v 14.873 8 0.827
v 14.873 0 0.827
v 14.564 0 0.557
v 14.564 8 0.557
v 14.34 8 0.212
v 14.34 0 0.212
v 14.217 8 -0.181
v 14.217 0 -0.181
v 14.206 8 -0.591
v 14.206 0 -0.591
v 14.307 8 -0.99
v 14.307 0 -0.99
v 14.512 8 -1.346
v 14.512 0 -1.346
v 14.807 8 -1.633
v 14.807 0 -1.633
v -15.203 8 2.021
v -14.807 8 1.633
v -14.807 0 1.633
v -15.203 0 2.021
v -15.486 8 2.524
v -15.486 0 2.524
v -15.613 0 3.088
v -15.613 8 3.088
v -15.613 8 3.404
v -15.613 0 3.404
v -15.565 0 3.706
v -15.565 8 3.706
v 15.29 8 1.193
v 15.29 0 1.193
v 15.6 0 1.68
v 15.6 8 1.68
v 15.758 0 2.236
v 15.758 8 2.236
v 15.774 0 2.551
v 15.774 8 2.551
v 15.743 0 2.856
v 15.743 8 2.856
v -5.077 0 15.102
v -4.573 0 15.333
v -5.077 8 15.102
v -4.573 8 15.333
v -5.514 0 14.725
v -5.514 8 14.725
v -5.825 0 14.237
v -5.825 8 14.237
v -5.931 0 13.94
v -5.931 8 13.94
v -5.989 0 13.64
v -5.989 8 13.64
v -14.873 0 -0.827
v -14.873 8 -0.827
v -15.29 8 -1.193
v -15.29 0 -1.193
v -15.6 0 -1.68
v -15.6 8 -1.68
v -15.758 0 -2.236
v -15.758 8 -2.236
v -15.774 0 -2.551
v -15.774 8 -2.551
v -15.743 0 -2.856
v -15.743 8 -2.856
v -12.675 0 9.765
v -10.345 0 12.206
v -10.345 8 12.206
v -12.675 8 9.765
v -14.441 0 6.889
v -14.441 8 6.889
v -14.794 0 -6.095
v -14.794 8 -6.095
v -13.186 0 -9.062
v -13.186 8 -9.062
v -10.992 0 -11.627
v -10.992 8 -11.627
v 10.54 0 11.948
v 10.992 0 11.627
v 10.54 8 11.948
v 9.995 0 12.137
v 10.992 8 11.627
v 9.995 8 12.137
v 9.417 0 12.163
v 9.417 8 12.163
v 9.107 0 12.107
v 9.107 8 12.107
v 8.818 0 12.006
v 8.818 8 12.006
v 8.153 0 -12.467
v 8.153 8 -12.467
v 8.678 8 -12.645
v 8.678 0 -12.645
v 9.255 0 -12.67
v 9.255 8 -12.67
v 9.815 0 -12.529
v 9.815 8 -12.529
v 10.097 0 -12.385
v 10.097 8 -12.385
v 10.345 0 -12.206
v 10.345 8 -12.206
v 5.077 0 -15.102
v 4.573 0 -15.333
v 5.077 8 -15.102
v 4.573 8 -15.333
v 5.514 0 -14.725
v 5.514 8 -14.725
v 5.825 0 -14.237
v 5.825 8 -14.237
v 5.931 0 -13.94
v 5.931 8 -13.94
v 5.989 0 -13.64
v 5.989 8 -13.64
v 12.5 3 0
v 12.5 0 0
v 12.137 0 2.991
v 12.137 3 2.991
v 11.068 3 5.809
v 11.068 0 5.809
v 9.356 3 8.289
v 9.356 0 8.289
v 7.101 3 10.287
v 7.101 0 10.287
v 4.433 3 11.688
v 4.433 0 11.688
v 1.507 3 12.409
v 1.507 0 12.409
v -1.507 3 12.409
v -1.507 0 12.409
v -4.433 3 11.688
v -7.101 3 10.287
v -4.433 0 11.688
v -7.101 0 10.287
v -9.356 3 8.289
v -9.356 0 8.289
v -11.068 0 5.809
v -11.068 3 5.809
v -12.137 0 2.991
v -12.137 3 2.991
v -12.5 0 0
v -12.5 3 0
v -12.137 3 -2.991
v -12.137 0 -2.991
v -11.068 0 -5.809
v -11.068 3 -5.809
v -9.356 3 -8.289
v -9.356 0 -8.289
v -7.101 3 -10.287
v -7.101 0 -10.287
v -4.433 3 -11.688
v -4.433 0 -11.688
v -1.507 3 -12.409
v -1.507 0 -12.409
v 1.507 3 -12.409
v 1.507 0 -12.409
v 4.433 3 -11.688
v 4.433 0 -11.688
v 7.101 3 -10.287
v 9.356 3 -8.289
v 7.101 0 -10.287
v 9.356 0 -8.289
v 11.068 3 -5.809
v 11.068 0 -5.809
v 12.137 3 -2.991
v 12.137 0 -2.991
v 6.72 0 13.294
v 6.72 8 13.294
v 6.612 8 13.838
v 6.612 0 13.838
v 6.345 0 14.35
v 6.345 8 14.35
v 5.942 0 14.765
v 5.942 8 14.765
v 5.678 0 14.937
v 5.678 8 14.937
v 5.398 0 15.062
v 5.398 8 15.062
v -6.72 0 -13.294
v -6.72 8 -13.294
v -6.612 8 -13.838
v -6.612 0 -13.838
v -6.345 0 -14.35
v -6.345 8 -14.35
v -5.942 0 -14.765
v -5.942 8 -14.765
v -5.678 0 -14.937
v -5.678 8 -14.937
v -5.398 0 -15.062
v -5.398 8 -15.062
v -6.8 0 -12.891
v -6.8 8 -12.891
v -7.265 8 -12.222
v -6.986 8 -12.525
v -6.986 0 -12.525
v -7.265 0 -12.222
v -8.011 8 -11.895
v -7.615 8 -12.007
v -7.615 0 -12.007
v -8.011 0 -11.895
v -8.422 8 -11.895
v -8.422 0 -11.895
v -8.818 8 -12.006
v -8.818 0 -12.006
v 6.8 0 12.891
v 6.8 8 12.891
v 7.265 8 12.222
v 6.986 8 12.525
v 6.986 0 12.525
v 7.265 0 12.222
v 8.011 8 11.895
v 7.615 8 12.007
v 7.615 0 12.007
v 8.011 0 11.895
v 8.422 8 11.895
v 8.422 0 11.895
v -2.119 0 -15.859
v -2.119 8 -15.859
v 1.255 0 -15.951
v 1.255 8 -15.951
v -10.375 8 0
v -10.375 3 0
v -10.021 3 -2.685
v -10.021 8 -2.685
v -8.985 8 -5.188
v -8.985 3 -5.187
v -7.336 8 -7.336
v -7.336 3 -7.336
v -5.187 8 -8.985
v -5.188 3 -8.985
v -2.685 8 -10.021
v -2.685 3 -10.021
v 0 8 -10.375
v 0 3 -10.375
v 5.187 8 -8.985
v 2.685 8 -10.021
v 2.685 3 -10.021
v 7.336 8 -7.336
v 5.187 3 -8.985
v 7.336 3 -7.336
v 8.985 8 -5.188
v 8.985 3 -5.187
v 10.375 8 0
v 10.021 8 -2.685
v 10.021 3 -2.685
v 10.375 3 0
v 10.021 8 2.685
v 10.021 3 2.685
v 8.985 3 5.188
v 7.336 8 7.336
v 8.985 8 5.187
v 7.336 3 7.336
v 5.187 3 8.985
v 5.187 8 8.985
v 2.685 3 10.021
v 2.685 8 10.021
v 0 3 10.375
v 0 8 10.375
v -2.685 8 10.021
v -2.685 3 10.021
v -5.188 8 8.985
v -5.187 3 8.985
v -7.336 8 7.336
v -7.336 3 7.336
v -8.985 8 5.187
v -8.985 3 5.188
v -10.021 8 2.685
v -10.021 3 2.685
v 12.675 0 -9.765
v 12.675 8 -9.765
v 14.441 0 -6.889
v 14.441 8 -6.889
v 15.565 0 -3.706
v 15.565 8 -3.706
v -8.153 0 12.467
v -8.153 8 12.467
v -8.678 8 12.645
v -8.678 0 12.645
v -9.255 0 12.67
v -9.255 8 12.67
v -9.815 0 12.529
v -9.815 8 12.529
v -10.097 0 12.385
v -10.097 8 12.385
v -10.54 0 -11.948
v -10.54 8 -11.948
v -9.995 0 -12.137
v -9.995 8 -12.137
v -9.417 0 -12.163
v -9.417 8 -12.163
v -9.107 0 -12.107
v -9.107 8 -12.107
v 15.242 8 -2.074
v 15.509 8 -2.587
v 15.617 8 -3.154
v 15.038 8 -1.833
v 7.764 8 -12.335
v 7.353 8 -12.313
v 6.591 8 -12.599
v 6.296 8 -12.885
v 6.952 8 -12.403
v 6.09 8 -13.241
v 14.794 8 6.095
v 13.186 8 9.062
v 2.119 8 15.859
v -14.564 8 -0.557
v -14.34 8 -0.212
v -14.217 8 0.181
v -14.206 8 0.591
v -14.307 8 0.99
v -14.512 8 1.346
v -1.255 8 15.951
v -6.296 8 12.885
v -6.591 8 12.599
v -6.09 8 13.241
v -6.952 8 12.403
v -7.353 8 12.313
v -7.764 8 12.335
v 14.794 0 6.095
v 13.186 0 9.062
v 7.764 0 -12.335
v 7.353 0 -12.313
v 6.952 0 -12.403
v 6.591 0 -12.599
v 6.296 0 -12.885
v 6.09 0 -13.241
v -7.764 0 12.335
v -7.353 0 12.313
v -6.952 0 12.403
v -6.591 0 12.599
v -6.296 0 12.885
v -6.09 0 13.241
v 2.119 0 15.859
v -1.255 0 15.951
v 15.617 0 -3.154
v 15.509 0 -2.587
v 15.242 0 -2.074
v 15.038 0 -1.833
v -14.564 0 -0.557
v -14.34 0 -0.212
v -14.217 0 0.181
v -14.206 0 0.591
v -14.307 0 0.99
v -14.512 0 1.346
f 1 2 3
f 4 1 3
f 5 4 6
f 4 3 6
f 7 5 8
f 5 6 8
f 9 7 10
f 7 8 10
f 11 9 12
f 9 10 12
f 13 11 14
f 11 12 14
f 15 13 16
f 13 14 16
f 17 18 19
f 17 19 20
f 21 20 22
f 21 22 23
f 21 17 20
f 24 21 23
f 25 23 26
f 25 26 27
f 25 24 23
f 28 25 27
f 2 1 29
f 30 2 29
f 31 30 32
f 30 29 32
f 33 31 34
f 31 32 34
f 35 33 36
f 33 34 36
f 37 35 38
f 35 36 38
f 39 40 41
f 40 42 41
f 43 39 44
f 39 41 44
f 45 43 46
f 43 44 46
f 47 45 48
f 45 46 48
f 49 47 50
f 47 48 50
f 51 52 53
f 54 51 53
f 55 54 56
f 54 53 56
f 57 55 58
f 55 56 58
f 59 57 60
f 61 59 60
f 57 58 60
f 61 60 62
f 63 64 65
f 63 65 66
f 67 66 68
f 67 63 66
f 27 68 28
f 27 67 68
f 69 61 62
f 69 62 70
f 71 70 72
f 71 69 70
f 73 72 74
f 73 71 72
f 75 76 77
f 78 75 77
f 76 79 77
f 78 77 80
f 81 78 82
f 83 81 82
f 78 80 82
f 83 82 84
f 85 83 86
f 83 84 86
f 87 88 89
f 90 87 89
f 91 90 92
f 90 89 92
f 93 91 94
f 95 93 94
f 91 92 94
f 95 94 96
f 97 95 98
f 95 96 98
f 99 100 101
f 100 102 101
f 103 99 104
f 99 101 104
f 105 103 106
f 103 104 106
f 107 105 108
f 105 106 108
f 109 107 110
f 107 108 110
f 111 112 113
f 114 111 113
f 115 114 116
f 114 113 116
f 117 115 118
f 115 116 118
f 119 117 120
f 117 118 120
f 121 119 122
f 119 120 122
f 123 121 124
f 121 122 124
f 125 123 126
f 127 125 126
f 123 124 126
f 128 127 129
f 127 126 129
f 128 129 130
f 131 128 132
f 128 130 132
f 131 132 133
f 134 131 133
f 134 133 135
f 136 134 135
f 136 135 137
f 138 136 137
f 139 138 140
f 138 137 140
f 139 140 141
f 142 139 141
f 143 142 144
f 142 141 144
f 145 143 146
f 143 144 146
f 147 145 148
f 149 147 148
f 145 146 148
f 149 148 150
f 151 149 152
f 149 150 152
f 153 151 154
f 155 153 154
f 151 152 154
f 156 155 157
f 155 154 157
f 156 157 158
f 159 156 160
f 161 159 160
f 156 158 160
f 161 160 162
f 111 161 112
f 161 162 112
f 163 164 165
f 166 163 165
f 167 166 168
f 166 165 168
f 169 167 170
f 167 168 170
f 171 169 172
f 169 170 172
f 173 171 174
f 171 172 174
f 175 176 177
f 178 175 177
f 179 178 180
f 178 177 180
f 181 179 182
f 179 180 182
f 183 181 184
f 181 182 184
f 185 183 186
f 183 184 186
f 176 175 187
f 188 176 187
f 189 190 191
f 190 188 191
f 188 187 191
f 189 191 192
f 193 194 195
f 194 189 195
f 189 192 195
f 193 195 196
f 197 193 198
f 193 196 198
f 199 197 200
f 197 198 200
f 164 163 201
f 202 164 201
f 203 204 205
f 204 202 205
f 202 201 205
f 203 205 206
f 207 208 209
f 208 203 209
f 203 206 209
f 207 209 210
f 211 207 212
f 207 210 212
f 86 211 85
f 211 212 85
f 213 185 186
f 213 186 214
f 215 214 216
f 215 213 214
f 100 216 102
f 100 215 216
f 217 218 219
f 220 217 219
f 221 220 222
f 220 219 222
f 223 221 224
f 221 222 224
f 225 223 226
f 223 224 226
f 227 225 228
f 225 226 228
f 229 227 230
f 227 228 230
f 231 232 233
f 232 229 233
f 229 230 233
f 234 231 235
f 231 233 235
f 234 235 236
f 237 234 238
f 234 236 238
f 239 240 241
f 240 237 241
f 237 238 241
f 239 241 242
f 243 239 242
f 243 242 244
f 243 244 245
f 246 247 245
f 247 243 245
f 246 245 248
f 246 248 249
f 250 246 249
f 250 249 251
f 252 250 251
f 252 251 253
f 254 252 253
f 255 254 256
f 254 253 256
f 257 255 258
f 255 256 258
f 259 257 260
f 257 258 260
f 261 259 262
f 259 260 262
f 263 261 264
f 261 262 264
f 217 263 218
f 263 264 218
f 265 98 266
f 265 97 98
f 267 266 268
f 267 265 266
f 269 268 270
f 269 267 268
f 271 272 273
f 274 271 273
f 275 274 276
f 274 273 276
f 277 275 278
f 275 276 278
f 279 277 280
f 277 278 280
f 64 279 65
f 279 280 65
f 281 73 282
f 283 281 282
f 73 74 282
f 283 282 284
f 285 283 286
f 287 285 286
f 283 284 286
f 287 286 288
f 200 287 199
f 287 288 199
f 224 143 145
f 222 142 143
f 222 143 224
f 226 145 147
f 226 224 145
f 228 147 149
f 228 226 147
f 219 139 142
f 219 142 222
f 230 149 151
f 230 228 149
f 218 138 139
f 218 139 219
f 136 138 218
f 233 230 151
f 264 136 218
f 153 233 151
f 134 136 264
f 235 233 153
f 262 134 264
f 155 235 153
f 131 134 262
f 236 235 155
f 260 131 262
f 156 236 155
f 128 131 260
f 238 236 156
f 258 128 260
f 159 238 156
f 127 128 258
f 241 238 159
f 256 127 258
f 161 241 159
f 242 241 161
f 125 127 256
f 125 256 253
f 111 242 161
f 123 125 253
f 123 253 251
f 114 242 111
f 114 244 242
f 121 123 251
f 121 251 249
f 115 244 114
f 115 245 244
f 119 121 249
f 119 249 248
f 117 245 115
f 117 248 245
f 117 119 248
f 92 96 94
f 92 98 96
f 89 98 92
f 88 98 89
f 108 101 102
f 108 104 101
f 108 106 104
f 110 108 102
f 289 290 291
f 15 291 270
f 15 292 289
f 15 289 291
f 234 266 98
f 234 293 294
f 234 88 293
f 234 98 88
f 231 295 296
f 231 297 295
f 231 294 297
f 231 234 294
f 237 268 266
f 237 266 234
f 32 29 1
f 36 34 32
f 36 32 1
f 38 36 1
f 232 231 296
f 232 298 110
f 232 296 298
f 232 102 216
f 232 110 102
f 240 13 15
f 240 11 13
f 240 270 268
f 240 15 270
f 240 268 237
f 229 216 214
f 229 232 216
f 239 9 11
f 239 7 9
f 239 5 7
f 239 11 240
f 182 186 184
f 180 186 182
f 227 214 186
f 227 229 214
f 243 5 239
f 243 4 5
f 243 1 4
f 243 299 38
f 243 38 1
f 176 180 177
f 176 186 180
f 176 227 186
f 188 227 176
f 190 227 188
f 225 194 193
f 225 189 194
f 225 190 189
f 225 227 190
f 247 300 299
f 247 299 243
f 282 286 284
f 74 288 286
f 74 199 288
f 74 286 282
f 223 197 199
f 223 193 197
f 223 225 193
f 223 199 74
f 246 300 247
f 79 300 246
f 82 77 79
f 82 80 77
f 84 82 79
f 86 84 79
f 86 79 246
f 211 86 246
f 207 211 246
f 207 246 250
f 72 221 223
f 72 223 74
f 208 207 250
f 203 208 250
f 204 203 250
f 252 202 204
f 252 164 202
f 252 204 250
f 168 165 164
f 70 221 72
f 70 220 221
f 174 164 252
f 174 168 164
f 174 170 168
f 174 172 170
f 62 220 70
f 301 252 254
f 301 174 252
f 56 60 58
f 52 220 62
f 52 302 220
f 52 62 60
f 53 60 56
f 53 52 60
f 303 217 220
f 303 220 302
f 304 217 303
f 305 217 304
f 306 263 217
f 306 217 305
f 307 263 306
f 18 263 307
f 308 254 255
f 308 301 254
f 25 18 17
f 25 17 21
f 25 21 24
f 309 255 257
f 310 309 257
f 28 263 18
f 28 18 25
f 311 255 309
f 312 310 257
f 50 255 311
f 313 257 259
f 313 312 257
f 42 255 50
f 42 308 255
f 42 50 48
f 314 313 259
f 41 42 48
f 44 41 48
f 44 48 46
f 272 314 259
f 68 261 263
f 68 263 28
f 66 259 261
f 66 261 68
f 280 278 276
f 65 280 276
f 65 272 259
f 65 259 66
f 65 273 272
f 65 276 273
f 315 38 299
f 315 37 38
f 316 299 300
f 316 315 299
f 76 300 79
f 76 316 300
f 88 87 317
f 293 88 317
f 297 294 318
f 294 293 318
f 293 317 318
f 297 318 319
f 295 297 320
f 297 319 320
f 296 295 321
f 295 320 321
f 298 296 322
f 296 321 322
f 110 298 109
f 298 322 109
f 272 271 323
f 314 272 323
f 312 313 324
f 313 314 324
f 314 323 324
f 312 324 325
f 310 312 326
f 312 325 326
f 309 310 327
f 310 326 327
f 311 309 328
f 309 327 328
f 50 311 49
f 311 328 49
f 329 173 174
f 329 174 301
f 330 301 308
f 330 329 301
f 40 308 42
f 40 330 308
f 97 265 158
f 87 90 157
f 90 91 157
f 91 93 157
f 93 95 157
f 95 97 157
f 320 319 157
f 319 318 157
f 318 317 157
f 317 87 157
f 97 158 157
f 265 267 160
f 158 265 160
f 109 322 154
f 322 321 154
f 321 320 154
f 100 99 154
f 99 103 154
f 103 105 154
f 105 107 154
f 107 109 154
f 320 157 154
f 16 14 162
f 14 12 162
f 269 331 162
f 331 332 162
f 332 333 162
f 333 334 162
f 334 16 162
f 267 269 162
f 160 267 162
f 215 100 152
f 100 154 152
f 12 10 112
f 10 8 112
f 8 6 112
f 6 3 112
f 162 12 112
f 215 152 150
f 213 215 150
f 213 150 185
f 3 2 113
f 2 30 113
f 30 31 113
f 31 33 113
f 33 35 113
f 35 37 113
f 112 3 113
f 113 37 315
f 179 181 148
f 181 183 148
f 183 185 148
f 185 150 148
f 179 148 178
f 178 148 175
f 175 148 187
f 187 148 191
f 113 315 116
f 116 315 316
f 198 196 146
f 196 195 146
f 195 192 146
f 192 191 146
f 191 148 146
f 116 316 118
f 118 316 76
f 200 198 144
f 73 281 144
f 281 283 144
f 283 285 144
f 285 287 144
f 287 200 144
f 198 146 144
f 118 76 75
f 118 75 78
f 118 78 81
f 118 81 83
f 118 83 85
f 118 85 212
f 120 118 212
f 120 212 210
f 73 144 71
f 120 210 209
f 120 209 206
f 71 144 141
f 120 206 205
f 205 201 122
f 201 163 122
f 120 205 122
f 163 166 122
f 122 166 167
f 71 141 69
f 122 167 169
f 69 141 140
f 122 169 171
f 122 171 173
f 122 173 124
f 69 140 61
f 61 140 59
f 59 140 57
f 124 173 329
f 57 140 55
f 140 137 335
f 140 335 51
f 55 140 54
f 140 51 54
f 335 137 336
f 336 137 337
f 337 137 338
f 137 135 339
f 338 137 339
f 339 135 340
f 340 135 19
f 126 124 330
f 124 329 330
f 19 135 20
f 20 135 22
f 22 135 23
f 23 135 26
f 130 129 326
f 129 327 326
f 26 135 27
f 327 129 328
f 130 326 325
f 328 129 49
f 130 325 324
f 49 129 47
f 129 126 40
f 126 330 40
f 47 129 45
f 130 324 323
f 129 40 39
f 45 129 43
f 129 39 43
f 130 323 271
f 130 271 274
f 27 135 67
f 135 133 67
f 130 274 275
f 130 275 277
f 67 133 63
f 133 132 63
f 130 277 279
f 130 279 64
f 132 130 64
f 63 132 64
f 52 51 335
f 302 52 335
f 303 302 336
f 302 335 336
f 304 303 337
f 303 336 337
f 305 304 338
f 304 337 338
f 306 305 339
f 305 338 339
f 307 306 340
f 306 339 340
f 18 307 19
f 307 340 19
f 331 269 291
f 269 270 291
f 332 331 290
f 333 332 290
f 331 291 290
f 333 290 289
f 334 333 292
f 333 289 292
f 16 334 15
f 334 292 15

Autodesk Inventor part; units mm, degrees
ref_plane "YZ Plane" through (0, 0, 0) normal (1, 0, 0) x (0, 1, 0)
ref_plane "XZ Plane" through (0, 0, 0) normal (0, 1, 0) x (-1, 0, 0)
ref_plane "XY Plane" through (0, 0, 0) normal (0, 0, 1) x (1, 0, 0)
sketch "Sketch1" plane through (0, 0, 0) normal (0, 1, 0) x (-1, 0, 0)
  circle A0 centre (0, 0) radius 10.375
  arc A1 (15.885, 1.9145) -> (15.9655, -1.0494) centre (15.6971, 0.4263) ccw
  arc A2 (6.2845, 14.7141) -> (8.8916, 13.3018) centre (7.4793, 13.8073) ccw
  arc A3 (-9.6005, 12.7996) -> (-7.0739, 14.3513) centre (-8.2178, 13.3809) ccw
  arc A4 (-15.885, -1.9145) -> (-15.9655, 1.0494) centre (-15.6971, -0.4263) ccw
  arc A5 (-6.2845, -14.7141) -> (-8.8916, -13.3018) centre (-7.4793, -13.8073) ccw
  arc A6 (9.6005, -12.7996) -> (7.0739, -14.3513) centre (8.2178, -13.3809) ccw
  arc A7 (9.6005, -12.7996) -> (15.9655, -1.0494) centre (0, 0) ccw
  arc A8 (-6.2845, -14.7141) -> (7.0739, -14.3513) centre (0, 0) ccw
  arc A9 (-15.885, -1.9145) -> (-8.8916, -13.3018) centre (0, 0) ccw
  arc A10 (-9.6005, 12.7996) -> (-15.9655, 1.0494) centre (0, 0) ccw
  arc A11 (15.885, 1.9145) -> (8.8916, 13.3018) centre (0, 0) ccw
  arc A12 (6.2845, 14.7141) -> (-7.0739, 14.3513) centre (0, 0) ccw
  dimension "d0" = 20.75
  dimension "d4" = 3
  dimension "d7" = 360
  dimension "d10" = 16
extrude "Extrusion1" add sketch "Sketch1" along normal blind 8
fillet "Fillet1" radius 2 12 edges at (9.6005, 4, 12.7996) (15.9655, 4, 1.0494) (15.885, 4, -1.9145) (8.8916, 4, -13.3018) (6.2845, 4, -14.7141) (-7.0739, 4, -14.3513) (-9.6005, 4, -12.7996) (-15.9655, 4, -1.0494) (-15.885, 4, 1.9145) (-8.8916, 4, 13.3018) (-6.2845, 4, 14.7141) (7.0739, 4, 14.3513)
sketch "Sketch2" plane through (0, 0, 0) normal (0, -1, 0) x (1, 0, 0)
  circle A0 centre (0, 0) radius 10.375 projected
  circle A1 centre (0, 0) radius 12.5
  dimension "d11" = 25
extrude "Extrusion2" cut sketch "Sketch2" against normal blind 3
properties part number "springSpacerV1"
